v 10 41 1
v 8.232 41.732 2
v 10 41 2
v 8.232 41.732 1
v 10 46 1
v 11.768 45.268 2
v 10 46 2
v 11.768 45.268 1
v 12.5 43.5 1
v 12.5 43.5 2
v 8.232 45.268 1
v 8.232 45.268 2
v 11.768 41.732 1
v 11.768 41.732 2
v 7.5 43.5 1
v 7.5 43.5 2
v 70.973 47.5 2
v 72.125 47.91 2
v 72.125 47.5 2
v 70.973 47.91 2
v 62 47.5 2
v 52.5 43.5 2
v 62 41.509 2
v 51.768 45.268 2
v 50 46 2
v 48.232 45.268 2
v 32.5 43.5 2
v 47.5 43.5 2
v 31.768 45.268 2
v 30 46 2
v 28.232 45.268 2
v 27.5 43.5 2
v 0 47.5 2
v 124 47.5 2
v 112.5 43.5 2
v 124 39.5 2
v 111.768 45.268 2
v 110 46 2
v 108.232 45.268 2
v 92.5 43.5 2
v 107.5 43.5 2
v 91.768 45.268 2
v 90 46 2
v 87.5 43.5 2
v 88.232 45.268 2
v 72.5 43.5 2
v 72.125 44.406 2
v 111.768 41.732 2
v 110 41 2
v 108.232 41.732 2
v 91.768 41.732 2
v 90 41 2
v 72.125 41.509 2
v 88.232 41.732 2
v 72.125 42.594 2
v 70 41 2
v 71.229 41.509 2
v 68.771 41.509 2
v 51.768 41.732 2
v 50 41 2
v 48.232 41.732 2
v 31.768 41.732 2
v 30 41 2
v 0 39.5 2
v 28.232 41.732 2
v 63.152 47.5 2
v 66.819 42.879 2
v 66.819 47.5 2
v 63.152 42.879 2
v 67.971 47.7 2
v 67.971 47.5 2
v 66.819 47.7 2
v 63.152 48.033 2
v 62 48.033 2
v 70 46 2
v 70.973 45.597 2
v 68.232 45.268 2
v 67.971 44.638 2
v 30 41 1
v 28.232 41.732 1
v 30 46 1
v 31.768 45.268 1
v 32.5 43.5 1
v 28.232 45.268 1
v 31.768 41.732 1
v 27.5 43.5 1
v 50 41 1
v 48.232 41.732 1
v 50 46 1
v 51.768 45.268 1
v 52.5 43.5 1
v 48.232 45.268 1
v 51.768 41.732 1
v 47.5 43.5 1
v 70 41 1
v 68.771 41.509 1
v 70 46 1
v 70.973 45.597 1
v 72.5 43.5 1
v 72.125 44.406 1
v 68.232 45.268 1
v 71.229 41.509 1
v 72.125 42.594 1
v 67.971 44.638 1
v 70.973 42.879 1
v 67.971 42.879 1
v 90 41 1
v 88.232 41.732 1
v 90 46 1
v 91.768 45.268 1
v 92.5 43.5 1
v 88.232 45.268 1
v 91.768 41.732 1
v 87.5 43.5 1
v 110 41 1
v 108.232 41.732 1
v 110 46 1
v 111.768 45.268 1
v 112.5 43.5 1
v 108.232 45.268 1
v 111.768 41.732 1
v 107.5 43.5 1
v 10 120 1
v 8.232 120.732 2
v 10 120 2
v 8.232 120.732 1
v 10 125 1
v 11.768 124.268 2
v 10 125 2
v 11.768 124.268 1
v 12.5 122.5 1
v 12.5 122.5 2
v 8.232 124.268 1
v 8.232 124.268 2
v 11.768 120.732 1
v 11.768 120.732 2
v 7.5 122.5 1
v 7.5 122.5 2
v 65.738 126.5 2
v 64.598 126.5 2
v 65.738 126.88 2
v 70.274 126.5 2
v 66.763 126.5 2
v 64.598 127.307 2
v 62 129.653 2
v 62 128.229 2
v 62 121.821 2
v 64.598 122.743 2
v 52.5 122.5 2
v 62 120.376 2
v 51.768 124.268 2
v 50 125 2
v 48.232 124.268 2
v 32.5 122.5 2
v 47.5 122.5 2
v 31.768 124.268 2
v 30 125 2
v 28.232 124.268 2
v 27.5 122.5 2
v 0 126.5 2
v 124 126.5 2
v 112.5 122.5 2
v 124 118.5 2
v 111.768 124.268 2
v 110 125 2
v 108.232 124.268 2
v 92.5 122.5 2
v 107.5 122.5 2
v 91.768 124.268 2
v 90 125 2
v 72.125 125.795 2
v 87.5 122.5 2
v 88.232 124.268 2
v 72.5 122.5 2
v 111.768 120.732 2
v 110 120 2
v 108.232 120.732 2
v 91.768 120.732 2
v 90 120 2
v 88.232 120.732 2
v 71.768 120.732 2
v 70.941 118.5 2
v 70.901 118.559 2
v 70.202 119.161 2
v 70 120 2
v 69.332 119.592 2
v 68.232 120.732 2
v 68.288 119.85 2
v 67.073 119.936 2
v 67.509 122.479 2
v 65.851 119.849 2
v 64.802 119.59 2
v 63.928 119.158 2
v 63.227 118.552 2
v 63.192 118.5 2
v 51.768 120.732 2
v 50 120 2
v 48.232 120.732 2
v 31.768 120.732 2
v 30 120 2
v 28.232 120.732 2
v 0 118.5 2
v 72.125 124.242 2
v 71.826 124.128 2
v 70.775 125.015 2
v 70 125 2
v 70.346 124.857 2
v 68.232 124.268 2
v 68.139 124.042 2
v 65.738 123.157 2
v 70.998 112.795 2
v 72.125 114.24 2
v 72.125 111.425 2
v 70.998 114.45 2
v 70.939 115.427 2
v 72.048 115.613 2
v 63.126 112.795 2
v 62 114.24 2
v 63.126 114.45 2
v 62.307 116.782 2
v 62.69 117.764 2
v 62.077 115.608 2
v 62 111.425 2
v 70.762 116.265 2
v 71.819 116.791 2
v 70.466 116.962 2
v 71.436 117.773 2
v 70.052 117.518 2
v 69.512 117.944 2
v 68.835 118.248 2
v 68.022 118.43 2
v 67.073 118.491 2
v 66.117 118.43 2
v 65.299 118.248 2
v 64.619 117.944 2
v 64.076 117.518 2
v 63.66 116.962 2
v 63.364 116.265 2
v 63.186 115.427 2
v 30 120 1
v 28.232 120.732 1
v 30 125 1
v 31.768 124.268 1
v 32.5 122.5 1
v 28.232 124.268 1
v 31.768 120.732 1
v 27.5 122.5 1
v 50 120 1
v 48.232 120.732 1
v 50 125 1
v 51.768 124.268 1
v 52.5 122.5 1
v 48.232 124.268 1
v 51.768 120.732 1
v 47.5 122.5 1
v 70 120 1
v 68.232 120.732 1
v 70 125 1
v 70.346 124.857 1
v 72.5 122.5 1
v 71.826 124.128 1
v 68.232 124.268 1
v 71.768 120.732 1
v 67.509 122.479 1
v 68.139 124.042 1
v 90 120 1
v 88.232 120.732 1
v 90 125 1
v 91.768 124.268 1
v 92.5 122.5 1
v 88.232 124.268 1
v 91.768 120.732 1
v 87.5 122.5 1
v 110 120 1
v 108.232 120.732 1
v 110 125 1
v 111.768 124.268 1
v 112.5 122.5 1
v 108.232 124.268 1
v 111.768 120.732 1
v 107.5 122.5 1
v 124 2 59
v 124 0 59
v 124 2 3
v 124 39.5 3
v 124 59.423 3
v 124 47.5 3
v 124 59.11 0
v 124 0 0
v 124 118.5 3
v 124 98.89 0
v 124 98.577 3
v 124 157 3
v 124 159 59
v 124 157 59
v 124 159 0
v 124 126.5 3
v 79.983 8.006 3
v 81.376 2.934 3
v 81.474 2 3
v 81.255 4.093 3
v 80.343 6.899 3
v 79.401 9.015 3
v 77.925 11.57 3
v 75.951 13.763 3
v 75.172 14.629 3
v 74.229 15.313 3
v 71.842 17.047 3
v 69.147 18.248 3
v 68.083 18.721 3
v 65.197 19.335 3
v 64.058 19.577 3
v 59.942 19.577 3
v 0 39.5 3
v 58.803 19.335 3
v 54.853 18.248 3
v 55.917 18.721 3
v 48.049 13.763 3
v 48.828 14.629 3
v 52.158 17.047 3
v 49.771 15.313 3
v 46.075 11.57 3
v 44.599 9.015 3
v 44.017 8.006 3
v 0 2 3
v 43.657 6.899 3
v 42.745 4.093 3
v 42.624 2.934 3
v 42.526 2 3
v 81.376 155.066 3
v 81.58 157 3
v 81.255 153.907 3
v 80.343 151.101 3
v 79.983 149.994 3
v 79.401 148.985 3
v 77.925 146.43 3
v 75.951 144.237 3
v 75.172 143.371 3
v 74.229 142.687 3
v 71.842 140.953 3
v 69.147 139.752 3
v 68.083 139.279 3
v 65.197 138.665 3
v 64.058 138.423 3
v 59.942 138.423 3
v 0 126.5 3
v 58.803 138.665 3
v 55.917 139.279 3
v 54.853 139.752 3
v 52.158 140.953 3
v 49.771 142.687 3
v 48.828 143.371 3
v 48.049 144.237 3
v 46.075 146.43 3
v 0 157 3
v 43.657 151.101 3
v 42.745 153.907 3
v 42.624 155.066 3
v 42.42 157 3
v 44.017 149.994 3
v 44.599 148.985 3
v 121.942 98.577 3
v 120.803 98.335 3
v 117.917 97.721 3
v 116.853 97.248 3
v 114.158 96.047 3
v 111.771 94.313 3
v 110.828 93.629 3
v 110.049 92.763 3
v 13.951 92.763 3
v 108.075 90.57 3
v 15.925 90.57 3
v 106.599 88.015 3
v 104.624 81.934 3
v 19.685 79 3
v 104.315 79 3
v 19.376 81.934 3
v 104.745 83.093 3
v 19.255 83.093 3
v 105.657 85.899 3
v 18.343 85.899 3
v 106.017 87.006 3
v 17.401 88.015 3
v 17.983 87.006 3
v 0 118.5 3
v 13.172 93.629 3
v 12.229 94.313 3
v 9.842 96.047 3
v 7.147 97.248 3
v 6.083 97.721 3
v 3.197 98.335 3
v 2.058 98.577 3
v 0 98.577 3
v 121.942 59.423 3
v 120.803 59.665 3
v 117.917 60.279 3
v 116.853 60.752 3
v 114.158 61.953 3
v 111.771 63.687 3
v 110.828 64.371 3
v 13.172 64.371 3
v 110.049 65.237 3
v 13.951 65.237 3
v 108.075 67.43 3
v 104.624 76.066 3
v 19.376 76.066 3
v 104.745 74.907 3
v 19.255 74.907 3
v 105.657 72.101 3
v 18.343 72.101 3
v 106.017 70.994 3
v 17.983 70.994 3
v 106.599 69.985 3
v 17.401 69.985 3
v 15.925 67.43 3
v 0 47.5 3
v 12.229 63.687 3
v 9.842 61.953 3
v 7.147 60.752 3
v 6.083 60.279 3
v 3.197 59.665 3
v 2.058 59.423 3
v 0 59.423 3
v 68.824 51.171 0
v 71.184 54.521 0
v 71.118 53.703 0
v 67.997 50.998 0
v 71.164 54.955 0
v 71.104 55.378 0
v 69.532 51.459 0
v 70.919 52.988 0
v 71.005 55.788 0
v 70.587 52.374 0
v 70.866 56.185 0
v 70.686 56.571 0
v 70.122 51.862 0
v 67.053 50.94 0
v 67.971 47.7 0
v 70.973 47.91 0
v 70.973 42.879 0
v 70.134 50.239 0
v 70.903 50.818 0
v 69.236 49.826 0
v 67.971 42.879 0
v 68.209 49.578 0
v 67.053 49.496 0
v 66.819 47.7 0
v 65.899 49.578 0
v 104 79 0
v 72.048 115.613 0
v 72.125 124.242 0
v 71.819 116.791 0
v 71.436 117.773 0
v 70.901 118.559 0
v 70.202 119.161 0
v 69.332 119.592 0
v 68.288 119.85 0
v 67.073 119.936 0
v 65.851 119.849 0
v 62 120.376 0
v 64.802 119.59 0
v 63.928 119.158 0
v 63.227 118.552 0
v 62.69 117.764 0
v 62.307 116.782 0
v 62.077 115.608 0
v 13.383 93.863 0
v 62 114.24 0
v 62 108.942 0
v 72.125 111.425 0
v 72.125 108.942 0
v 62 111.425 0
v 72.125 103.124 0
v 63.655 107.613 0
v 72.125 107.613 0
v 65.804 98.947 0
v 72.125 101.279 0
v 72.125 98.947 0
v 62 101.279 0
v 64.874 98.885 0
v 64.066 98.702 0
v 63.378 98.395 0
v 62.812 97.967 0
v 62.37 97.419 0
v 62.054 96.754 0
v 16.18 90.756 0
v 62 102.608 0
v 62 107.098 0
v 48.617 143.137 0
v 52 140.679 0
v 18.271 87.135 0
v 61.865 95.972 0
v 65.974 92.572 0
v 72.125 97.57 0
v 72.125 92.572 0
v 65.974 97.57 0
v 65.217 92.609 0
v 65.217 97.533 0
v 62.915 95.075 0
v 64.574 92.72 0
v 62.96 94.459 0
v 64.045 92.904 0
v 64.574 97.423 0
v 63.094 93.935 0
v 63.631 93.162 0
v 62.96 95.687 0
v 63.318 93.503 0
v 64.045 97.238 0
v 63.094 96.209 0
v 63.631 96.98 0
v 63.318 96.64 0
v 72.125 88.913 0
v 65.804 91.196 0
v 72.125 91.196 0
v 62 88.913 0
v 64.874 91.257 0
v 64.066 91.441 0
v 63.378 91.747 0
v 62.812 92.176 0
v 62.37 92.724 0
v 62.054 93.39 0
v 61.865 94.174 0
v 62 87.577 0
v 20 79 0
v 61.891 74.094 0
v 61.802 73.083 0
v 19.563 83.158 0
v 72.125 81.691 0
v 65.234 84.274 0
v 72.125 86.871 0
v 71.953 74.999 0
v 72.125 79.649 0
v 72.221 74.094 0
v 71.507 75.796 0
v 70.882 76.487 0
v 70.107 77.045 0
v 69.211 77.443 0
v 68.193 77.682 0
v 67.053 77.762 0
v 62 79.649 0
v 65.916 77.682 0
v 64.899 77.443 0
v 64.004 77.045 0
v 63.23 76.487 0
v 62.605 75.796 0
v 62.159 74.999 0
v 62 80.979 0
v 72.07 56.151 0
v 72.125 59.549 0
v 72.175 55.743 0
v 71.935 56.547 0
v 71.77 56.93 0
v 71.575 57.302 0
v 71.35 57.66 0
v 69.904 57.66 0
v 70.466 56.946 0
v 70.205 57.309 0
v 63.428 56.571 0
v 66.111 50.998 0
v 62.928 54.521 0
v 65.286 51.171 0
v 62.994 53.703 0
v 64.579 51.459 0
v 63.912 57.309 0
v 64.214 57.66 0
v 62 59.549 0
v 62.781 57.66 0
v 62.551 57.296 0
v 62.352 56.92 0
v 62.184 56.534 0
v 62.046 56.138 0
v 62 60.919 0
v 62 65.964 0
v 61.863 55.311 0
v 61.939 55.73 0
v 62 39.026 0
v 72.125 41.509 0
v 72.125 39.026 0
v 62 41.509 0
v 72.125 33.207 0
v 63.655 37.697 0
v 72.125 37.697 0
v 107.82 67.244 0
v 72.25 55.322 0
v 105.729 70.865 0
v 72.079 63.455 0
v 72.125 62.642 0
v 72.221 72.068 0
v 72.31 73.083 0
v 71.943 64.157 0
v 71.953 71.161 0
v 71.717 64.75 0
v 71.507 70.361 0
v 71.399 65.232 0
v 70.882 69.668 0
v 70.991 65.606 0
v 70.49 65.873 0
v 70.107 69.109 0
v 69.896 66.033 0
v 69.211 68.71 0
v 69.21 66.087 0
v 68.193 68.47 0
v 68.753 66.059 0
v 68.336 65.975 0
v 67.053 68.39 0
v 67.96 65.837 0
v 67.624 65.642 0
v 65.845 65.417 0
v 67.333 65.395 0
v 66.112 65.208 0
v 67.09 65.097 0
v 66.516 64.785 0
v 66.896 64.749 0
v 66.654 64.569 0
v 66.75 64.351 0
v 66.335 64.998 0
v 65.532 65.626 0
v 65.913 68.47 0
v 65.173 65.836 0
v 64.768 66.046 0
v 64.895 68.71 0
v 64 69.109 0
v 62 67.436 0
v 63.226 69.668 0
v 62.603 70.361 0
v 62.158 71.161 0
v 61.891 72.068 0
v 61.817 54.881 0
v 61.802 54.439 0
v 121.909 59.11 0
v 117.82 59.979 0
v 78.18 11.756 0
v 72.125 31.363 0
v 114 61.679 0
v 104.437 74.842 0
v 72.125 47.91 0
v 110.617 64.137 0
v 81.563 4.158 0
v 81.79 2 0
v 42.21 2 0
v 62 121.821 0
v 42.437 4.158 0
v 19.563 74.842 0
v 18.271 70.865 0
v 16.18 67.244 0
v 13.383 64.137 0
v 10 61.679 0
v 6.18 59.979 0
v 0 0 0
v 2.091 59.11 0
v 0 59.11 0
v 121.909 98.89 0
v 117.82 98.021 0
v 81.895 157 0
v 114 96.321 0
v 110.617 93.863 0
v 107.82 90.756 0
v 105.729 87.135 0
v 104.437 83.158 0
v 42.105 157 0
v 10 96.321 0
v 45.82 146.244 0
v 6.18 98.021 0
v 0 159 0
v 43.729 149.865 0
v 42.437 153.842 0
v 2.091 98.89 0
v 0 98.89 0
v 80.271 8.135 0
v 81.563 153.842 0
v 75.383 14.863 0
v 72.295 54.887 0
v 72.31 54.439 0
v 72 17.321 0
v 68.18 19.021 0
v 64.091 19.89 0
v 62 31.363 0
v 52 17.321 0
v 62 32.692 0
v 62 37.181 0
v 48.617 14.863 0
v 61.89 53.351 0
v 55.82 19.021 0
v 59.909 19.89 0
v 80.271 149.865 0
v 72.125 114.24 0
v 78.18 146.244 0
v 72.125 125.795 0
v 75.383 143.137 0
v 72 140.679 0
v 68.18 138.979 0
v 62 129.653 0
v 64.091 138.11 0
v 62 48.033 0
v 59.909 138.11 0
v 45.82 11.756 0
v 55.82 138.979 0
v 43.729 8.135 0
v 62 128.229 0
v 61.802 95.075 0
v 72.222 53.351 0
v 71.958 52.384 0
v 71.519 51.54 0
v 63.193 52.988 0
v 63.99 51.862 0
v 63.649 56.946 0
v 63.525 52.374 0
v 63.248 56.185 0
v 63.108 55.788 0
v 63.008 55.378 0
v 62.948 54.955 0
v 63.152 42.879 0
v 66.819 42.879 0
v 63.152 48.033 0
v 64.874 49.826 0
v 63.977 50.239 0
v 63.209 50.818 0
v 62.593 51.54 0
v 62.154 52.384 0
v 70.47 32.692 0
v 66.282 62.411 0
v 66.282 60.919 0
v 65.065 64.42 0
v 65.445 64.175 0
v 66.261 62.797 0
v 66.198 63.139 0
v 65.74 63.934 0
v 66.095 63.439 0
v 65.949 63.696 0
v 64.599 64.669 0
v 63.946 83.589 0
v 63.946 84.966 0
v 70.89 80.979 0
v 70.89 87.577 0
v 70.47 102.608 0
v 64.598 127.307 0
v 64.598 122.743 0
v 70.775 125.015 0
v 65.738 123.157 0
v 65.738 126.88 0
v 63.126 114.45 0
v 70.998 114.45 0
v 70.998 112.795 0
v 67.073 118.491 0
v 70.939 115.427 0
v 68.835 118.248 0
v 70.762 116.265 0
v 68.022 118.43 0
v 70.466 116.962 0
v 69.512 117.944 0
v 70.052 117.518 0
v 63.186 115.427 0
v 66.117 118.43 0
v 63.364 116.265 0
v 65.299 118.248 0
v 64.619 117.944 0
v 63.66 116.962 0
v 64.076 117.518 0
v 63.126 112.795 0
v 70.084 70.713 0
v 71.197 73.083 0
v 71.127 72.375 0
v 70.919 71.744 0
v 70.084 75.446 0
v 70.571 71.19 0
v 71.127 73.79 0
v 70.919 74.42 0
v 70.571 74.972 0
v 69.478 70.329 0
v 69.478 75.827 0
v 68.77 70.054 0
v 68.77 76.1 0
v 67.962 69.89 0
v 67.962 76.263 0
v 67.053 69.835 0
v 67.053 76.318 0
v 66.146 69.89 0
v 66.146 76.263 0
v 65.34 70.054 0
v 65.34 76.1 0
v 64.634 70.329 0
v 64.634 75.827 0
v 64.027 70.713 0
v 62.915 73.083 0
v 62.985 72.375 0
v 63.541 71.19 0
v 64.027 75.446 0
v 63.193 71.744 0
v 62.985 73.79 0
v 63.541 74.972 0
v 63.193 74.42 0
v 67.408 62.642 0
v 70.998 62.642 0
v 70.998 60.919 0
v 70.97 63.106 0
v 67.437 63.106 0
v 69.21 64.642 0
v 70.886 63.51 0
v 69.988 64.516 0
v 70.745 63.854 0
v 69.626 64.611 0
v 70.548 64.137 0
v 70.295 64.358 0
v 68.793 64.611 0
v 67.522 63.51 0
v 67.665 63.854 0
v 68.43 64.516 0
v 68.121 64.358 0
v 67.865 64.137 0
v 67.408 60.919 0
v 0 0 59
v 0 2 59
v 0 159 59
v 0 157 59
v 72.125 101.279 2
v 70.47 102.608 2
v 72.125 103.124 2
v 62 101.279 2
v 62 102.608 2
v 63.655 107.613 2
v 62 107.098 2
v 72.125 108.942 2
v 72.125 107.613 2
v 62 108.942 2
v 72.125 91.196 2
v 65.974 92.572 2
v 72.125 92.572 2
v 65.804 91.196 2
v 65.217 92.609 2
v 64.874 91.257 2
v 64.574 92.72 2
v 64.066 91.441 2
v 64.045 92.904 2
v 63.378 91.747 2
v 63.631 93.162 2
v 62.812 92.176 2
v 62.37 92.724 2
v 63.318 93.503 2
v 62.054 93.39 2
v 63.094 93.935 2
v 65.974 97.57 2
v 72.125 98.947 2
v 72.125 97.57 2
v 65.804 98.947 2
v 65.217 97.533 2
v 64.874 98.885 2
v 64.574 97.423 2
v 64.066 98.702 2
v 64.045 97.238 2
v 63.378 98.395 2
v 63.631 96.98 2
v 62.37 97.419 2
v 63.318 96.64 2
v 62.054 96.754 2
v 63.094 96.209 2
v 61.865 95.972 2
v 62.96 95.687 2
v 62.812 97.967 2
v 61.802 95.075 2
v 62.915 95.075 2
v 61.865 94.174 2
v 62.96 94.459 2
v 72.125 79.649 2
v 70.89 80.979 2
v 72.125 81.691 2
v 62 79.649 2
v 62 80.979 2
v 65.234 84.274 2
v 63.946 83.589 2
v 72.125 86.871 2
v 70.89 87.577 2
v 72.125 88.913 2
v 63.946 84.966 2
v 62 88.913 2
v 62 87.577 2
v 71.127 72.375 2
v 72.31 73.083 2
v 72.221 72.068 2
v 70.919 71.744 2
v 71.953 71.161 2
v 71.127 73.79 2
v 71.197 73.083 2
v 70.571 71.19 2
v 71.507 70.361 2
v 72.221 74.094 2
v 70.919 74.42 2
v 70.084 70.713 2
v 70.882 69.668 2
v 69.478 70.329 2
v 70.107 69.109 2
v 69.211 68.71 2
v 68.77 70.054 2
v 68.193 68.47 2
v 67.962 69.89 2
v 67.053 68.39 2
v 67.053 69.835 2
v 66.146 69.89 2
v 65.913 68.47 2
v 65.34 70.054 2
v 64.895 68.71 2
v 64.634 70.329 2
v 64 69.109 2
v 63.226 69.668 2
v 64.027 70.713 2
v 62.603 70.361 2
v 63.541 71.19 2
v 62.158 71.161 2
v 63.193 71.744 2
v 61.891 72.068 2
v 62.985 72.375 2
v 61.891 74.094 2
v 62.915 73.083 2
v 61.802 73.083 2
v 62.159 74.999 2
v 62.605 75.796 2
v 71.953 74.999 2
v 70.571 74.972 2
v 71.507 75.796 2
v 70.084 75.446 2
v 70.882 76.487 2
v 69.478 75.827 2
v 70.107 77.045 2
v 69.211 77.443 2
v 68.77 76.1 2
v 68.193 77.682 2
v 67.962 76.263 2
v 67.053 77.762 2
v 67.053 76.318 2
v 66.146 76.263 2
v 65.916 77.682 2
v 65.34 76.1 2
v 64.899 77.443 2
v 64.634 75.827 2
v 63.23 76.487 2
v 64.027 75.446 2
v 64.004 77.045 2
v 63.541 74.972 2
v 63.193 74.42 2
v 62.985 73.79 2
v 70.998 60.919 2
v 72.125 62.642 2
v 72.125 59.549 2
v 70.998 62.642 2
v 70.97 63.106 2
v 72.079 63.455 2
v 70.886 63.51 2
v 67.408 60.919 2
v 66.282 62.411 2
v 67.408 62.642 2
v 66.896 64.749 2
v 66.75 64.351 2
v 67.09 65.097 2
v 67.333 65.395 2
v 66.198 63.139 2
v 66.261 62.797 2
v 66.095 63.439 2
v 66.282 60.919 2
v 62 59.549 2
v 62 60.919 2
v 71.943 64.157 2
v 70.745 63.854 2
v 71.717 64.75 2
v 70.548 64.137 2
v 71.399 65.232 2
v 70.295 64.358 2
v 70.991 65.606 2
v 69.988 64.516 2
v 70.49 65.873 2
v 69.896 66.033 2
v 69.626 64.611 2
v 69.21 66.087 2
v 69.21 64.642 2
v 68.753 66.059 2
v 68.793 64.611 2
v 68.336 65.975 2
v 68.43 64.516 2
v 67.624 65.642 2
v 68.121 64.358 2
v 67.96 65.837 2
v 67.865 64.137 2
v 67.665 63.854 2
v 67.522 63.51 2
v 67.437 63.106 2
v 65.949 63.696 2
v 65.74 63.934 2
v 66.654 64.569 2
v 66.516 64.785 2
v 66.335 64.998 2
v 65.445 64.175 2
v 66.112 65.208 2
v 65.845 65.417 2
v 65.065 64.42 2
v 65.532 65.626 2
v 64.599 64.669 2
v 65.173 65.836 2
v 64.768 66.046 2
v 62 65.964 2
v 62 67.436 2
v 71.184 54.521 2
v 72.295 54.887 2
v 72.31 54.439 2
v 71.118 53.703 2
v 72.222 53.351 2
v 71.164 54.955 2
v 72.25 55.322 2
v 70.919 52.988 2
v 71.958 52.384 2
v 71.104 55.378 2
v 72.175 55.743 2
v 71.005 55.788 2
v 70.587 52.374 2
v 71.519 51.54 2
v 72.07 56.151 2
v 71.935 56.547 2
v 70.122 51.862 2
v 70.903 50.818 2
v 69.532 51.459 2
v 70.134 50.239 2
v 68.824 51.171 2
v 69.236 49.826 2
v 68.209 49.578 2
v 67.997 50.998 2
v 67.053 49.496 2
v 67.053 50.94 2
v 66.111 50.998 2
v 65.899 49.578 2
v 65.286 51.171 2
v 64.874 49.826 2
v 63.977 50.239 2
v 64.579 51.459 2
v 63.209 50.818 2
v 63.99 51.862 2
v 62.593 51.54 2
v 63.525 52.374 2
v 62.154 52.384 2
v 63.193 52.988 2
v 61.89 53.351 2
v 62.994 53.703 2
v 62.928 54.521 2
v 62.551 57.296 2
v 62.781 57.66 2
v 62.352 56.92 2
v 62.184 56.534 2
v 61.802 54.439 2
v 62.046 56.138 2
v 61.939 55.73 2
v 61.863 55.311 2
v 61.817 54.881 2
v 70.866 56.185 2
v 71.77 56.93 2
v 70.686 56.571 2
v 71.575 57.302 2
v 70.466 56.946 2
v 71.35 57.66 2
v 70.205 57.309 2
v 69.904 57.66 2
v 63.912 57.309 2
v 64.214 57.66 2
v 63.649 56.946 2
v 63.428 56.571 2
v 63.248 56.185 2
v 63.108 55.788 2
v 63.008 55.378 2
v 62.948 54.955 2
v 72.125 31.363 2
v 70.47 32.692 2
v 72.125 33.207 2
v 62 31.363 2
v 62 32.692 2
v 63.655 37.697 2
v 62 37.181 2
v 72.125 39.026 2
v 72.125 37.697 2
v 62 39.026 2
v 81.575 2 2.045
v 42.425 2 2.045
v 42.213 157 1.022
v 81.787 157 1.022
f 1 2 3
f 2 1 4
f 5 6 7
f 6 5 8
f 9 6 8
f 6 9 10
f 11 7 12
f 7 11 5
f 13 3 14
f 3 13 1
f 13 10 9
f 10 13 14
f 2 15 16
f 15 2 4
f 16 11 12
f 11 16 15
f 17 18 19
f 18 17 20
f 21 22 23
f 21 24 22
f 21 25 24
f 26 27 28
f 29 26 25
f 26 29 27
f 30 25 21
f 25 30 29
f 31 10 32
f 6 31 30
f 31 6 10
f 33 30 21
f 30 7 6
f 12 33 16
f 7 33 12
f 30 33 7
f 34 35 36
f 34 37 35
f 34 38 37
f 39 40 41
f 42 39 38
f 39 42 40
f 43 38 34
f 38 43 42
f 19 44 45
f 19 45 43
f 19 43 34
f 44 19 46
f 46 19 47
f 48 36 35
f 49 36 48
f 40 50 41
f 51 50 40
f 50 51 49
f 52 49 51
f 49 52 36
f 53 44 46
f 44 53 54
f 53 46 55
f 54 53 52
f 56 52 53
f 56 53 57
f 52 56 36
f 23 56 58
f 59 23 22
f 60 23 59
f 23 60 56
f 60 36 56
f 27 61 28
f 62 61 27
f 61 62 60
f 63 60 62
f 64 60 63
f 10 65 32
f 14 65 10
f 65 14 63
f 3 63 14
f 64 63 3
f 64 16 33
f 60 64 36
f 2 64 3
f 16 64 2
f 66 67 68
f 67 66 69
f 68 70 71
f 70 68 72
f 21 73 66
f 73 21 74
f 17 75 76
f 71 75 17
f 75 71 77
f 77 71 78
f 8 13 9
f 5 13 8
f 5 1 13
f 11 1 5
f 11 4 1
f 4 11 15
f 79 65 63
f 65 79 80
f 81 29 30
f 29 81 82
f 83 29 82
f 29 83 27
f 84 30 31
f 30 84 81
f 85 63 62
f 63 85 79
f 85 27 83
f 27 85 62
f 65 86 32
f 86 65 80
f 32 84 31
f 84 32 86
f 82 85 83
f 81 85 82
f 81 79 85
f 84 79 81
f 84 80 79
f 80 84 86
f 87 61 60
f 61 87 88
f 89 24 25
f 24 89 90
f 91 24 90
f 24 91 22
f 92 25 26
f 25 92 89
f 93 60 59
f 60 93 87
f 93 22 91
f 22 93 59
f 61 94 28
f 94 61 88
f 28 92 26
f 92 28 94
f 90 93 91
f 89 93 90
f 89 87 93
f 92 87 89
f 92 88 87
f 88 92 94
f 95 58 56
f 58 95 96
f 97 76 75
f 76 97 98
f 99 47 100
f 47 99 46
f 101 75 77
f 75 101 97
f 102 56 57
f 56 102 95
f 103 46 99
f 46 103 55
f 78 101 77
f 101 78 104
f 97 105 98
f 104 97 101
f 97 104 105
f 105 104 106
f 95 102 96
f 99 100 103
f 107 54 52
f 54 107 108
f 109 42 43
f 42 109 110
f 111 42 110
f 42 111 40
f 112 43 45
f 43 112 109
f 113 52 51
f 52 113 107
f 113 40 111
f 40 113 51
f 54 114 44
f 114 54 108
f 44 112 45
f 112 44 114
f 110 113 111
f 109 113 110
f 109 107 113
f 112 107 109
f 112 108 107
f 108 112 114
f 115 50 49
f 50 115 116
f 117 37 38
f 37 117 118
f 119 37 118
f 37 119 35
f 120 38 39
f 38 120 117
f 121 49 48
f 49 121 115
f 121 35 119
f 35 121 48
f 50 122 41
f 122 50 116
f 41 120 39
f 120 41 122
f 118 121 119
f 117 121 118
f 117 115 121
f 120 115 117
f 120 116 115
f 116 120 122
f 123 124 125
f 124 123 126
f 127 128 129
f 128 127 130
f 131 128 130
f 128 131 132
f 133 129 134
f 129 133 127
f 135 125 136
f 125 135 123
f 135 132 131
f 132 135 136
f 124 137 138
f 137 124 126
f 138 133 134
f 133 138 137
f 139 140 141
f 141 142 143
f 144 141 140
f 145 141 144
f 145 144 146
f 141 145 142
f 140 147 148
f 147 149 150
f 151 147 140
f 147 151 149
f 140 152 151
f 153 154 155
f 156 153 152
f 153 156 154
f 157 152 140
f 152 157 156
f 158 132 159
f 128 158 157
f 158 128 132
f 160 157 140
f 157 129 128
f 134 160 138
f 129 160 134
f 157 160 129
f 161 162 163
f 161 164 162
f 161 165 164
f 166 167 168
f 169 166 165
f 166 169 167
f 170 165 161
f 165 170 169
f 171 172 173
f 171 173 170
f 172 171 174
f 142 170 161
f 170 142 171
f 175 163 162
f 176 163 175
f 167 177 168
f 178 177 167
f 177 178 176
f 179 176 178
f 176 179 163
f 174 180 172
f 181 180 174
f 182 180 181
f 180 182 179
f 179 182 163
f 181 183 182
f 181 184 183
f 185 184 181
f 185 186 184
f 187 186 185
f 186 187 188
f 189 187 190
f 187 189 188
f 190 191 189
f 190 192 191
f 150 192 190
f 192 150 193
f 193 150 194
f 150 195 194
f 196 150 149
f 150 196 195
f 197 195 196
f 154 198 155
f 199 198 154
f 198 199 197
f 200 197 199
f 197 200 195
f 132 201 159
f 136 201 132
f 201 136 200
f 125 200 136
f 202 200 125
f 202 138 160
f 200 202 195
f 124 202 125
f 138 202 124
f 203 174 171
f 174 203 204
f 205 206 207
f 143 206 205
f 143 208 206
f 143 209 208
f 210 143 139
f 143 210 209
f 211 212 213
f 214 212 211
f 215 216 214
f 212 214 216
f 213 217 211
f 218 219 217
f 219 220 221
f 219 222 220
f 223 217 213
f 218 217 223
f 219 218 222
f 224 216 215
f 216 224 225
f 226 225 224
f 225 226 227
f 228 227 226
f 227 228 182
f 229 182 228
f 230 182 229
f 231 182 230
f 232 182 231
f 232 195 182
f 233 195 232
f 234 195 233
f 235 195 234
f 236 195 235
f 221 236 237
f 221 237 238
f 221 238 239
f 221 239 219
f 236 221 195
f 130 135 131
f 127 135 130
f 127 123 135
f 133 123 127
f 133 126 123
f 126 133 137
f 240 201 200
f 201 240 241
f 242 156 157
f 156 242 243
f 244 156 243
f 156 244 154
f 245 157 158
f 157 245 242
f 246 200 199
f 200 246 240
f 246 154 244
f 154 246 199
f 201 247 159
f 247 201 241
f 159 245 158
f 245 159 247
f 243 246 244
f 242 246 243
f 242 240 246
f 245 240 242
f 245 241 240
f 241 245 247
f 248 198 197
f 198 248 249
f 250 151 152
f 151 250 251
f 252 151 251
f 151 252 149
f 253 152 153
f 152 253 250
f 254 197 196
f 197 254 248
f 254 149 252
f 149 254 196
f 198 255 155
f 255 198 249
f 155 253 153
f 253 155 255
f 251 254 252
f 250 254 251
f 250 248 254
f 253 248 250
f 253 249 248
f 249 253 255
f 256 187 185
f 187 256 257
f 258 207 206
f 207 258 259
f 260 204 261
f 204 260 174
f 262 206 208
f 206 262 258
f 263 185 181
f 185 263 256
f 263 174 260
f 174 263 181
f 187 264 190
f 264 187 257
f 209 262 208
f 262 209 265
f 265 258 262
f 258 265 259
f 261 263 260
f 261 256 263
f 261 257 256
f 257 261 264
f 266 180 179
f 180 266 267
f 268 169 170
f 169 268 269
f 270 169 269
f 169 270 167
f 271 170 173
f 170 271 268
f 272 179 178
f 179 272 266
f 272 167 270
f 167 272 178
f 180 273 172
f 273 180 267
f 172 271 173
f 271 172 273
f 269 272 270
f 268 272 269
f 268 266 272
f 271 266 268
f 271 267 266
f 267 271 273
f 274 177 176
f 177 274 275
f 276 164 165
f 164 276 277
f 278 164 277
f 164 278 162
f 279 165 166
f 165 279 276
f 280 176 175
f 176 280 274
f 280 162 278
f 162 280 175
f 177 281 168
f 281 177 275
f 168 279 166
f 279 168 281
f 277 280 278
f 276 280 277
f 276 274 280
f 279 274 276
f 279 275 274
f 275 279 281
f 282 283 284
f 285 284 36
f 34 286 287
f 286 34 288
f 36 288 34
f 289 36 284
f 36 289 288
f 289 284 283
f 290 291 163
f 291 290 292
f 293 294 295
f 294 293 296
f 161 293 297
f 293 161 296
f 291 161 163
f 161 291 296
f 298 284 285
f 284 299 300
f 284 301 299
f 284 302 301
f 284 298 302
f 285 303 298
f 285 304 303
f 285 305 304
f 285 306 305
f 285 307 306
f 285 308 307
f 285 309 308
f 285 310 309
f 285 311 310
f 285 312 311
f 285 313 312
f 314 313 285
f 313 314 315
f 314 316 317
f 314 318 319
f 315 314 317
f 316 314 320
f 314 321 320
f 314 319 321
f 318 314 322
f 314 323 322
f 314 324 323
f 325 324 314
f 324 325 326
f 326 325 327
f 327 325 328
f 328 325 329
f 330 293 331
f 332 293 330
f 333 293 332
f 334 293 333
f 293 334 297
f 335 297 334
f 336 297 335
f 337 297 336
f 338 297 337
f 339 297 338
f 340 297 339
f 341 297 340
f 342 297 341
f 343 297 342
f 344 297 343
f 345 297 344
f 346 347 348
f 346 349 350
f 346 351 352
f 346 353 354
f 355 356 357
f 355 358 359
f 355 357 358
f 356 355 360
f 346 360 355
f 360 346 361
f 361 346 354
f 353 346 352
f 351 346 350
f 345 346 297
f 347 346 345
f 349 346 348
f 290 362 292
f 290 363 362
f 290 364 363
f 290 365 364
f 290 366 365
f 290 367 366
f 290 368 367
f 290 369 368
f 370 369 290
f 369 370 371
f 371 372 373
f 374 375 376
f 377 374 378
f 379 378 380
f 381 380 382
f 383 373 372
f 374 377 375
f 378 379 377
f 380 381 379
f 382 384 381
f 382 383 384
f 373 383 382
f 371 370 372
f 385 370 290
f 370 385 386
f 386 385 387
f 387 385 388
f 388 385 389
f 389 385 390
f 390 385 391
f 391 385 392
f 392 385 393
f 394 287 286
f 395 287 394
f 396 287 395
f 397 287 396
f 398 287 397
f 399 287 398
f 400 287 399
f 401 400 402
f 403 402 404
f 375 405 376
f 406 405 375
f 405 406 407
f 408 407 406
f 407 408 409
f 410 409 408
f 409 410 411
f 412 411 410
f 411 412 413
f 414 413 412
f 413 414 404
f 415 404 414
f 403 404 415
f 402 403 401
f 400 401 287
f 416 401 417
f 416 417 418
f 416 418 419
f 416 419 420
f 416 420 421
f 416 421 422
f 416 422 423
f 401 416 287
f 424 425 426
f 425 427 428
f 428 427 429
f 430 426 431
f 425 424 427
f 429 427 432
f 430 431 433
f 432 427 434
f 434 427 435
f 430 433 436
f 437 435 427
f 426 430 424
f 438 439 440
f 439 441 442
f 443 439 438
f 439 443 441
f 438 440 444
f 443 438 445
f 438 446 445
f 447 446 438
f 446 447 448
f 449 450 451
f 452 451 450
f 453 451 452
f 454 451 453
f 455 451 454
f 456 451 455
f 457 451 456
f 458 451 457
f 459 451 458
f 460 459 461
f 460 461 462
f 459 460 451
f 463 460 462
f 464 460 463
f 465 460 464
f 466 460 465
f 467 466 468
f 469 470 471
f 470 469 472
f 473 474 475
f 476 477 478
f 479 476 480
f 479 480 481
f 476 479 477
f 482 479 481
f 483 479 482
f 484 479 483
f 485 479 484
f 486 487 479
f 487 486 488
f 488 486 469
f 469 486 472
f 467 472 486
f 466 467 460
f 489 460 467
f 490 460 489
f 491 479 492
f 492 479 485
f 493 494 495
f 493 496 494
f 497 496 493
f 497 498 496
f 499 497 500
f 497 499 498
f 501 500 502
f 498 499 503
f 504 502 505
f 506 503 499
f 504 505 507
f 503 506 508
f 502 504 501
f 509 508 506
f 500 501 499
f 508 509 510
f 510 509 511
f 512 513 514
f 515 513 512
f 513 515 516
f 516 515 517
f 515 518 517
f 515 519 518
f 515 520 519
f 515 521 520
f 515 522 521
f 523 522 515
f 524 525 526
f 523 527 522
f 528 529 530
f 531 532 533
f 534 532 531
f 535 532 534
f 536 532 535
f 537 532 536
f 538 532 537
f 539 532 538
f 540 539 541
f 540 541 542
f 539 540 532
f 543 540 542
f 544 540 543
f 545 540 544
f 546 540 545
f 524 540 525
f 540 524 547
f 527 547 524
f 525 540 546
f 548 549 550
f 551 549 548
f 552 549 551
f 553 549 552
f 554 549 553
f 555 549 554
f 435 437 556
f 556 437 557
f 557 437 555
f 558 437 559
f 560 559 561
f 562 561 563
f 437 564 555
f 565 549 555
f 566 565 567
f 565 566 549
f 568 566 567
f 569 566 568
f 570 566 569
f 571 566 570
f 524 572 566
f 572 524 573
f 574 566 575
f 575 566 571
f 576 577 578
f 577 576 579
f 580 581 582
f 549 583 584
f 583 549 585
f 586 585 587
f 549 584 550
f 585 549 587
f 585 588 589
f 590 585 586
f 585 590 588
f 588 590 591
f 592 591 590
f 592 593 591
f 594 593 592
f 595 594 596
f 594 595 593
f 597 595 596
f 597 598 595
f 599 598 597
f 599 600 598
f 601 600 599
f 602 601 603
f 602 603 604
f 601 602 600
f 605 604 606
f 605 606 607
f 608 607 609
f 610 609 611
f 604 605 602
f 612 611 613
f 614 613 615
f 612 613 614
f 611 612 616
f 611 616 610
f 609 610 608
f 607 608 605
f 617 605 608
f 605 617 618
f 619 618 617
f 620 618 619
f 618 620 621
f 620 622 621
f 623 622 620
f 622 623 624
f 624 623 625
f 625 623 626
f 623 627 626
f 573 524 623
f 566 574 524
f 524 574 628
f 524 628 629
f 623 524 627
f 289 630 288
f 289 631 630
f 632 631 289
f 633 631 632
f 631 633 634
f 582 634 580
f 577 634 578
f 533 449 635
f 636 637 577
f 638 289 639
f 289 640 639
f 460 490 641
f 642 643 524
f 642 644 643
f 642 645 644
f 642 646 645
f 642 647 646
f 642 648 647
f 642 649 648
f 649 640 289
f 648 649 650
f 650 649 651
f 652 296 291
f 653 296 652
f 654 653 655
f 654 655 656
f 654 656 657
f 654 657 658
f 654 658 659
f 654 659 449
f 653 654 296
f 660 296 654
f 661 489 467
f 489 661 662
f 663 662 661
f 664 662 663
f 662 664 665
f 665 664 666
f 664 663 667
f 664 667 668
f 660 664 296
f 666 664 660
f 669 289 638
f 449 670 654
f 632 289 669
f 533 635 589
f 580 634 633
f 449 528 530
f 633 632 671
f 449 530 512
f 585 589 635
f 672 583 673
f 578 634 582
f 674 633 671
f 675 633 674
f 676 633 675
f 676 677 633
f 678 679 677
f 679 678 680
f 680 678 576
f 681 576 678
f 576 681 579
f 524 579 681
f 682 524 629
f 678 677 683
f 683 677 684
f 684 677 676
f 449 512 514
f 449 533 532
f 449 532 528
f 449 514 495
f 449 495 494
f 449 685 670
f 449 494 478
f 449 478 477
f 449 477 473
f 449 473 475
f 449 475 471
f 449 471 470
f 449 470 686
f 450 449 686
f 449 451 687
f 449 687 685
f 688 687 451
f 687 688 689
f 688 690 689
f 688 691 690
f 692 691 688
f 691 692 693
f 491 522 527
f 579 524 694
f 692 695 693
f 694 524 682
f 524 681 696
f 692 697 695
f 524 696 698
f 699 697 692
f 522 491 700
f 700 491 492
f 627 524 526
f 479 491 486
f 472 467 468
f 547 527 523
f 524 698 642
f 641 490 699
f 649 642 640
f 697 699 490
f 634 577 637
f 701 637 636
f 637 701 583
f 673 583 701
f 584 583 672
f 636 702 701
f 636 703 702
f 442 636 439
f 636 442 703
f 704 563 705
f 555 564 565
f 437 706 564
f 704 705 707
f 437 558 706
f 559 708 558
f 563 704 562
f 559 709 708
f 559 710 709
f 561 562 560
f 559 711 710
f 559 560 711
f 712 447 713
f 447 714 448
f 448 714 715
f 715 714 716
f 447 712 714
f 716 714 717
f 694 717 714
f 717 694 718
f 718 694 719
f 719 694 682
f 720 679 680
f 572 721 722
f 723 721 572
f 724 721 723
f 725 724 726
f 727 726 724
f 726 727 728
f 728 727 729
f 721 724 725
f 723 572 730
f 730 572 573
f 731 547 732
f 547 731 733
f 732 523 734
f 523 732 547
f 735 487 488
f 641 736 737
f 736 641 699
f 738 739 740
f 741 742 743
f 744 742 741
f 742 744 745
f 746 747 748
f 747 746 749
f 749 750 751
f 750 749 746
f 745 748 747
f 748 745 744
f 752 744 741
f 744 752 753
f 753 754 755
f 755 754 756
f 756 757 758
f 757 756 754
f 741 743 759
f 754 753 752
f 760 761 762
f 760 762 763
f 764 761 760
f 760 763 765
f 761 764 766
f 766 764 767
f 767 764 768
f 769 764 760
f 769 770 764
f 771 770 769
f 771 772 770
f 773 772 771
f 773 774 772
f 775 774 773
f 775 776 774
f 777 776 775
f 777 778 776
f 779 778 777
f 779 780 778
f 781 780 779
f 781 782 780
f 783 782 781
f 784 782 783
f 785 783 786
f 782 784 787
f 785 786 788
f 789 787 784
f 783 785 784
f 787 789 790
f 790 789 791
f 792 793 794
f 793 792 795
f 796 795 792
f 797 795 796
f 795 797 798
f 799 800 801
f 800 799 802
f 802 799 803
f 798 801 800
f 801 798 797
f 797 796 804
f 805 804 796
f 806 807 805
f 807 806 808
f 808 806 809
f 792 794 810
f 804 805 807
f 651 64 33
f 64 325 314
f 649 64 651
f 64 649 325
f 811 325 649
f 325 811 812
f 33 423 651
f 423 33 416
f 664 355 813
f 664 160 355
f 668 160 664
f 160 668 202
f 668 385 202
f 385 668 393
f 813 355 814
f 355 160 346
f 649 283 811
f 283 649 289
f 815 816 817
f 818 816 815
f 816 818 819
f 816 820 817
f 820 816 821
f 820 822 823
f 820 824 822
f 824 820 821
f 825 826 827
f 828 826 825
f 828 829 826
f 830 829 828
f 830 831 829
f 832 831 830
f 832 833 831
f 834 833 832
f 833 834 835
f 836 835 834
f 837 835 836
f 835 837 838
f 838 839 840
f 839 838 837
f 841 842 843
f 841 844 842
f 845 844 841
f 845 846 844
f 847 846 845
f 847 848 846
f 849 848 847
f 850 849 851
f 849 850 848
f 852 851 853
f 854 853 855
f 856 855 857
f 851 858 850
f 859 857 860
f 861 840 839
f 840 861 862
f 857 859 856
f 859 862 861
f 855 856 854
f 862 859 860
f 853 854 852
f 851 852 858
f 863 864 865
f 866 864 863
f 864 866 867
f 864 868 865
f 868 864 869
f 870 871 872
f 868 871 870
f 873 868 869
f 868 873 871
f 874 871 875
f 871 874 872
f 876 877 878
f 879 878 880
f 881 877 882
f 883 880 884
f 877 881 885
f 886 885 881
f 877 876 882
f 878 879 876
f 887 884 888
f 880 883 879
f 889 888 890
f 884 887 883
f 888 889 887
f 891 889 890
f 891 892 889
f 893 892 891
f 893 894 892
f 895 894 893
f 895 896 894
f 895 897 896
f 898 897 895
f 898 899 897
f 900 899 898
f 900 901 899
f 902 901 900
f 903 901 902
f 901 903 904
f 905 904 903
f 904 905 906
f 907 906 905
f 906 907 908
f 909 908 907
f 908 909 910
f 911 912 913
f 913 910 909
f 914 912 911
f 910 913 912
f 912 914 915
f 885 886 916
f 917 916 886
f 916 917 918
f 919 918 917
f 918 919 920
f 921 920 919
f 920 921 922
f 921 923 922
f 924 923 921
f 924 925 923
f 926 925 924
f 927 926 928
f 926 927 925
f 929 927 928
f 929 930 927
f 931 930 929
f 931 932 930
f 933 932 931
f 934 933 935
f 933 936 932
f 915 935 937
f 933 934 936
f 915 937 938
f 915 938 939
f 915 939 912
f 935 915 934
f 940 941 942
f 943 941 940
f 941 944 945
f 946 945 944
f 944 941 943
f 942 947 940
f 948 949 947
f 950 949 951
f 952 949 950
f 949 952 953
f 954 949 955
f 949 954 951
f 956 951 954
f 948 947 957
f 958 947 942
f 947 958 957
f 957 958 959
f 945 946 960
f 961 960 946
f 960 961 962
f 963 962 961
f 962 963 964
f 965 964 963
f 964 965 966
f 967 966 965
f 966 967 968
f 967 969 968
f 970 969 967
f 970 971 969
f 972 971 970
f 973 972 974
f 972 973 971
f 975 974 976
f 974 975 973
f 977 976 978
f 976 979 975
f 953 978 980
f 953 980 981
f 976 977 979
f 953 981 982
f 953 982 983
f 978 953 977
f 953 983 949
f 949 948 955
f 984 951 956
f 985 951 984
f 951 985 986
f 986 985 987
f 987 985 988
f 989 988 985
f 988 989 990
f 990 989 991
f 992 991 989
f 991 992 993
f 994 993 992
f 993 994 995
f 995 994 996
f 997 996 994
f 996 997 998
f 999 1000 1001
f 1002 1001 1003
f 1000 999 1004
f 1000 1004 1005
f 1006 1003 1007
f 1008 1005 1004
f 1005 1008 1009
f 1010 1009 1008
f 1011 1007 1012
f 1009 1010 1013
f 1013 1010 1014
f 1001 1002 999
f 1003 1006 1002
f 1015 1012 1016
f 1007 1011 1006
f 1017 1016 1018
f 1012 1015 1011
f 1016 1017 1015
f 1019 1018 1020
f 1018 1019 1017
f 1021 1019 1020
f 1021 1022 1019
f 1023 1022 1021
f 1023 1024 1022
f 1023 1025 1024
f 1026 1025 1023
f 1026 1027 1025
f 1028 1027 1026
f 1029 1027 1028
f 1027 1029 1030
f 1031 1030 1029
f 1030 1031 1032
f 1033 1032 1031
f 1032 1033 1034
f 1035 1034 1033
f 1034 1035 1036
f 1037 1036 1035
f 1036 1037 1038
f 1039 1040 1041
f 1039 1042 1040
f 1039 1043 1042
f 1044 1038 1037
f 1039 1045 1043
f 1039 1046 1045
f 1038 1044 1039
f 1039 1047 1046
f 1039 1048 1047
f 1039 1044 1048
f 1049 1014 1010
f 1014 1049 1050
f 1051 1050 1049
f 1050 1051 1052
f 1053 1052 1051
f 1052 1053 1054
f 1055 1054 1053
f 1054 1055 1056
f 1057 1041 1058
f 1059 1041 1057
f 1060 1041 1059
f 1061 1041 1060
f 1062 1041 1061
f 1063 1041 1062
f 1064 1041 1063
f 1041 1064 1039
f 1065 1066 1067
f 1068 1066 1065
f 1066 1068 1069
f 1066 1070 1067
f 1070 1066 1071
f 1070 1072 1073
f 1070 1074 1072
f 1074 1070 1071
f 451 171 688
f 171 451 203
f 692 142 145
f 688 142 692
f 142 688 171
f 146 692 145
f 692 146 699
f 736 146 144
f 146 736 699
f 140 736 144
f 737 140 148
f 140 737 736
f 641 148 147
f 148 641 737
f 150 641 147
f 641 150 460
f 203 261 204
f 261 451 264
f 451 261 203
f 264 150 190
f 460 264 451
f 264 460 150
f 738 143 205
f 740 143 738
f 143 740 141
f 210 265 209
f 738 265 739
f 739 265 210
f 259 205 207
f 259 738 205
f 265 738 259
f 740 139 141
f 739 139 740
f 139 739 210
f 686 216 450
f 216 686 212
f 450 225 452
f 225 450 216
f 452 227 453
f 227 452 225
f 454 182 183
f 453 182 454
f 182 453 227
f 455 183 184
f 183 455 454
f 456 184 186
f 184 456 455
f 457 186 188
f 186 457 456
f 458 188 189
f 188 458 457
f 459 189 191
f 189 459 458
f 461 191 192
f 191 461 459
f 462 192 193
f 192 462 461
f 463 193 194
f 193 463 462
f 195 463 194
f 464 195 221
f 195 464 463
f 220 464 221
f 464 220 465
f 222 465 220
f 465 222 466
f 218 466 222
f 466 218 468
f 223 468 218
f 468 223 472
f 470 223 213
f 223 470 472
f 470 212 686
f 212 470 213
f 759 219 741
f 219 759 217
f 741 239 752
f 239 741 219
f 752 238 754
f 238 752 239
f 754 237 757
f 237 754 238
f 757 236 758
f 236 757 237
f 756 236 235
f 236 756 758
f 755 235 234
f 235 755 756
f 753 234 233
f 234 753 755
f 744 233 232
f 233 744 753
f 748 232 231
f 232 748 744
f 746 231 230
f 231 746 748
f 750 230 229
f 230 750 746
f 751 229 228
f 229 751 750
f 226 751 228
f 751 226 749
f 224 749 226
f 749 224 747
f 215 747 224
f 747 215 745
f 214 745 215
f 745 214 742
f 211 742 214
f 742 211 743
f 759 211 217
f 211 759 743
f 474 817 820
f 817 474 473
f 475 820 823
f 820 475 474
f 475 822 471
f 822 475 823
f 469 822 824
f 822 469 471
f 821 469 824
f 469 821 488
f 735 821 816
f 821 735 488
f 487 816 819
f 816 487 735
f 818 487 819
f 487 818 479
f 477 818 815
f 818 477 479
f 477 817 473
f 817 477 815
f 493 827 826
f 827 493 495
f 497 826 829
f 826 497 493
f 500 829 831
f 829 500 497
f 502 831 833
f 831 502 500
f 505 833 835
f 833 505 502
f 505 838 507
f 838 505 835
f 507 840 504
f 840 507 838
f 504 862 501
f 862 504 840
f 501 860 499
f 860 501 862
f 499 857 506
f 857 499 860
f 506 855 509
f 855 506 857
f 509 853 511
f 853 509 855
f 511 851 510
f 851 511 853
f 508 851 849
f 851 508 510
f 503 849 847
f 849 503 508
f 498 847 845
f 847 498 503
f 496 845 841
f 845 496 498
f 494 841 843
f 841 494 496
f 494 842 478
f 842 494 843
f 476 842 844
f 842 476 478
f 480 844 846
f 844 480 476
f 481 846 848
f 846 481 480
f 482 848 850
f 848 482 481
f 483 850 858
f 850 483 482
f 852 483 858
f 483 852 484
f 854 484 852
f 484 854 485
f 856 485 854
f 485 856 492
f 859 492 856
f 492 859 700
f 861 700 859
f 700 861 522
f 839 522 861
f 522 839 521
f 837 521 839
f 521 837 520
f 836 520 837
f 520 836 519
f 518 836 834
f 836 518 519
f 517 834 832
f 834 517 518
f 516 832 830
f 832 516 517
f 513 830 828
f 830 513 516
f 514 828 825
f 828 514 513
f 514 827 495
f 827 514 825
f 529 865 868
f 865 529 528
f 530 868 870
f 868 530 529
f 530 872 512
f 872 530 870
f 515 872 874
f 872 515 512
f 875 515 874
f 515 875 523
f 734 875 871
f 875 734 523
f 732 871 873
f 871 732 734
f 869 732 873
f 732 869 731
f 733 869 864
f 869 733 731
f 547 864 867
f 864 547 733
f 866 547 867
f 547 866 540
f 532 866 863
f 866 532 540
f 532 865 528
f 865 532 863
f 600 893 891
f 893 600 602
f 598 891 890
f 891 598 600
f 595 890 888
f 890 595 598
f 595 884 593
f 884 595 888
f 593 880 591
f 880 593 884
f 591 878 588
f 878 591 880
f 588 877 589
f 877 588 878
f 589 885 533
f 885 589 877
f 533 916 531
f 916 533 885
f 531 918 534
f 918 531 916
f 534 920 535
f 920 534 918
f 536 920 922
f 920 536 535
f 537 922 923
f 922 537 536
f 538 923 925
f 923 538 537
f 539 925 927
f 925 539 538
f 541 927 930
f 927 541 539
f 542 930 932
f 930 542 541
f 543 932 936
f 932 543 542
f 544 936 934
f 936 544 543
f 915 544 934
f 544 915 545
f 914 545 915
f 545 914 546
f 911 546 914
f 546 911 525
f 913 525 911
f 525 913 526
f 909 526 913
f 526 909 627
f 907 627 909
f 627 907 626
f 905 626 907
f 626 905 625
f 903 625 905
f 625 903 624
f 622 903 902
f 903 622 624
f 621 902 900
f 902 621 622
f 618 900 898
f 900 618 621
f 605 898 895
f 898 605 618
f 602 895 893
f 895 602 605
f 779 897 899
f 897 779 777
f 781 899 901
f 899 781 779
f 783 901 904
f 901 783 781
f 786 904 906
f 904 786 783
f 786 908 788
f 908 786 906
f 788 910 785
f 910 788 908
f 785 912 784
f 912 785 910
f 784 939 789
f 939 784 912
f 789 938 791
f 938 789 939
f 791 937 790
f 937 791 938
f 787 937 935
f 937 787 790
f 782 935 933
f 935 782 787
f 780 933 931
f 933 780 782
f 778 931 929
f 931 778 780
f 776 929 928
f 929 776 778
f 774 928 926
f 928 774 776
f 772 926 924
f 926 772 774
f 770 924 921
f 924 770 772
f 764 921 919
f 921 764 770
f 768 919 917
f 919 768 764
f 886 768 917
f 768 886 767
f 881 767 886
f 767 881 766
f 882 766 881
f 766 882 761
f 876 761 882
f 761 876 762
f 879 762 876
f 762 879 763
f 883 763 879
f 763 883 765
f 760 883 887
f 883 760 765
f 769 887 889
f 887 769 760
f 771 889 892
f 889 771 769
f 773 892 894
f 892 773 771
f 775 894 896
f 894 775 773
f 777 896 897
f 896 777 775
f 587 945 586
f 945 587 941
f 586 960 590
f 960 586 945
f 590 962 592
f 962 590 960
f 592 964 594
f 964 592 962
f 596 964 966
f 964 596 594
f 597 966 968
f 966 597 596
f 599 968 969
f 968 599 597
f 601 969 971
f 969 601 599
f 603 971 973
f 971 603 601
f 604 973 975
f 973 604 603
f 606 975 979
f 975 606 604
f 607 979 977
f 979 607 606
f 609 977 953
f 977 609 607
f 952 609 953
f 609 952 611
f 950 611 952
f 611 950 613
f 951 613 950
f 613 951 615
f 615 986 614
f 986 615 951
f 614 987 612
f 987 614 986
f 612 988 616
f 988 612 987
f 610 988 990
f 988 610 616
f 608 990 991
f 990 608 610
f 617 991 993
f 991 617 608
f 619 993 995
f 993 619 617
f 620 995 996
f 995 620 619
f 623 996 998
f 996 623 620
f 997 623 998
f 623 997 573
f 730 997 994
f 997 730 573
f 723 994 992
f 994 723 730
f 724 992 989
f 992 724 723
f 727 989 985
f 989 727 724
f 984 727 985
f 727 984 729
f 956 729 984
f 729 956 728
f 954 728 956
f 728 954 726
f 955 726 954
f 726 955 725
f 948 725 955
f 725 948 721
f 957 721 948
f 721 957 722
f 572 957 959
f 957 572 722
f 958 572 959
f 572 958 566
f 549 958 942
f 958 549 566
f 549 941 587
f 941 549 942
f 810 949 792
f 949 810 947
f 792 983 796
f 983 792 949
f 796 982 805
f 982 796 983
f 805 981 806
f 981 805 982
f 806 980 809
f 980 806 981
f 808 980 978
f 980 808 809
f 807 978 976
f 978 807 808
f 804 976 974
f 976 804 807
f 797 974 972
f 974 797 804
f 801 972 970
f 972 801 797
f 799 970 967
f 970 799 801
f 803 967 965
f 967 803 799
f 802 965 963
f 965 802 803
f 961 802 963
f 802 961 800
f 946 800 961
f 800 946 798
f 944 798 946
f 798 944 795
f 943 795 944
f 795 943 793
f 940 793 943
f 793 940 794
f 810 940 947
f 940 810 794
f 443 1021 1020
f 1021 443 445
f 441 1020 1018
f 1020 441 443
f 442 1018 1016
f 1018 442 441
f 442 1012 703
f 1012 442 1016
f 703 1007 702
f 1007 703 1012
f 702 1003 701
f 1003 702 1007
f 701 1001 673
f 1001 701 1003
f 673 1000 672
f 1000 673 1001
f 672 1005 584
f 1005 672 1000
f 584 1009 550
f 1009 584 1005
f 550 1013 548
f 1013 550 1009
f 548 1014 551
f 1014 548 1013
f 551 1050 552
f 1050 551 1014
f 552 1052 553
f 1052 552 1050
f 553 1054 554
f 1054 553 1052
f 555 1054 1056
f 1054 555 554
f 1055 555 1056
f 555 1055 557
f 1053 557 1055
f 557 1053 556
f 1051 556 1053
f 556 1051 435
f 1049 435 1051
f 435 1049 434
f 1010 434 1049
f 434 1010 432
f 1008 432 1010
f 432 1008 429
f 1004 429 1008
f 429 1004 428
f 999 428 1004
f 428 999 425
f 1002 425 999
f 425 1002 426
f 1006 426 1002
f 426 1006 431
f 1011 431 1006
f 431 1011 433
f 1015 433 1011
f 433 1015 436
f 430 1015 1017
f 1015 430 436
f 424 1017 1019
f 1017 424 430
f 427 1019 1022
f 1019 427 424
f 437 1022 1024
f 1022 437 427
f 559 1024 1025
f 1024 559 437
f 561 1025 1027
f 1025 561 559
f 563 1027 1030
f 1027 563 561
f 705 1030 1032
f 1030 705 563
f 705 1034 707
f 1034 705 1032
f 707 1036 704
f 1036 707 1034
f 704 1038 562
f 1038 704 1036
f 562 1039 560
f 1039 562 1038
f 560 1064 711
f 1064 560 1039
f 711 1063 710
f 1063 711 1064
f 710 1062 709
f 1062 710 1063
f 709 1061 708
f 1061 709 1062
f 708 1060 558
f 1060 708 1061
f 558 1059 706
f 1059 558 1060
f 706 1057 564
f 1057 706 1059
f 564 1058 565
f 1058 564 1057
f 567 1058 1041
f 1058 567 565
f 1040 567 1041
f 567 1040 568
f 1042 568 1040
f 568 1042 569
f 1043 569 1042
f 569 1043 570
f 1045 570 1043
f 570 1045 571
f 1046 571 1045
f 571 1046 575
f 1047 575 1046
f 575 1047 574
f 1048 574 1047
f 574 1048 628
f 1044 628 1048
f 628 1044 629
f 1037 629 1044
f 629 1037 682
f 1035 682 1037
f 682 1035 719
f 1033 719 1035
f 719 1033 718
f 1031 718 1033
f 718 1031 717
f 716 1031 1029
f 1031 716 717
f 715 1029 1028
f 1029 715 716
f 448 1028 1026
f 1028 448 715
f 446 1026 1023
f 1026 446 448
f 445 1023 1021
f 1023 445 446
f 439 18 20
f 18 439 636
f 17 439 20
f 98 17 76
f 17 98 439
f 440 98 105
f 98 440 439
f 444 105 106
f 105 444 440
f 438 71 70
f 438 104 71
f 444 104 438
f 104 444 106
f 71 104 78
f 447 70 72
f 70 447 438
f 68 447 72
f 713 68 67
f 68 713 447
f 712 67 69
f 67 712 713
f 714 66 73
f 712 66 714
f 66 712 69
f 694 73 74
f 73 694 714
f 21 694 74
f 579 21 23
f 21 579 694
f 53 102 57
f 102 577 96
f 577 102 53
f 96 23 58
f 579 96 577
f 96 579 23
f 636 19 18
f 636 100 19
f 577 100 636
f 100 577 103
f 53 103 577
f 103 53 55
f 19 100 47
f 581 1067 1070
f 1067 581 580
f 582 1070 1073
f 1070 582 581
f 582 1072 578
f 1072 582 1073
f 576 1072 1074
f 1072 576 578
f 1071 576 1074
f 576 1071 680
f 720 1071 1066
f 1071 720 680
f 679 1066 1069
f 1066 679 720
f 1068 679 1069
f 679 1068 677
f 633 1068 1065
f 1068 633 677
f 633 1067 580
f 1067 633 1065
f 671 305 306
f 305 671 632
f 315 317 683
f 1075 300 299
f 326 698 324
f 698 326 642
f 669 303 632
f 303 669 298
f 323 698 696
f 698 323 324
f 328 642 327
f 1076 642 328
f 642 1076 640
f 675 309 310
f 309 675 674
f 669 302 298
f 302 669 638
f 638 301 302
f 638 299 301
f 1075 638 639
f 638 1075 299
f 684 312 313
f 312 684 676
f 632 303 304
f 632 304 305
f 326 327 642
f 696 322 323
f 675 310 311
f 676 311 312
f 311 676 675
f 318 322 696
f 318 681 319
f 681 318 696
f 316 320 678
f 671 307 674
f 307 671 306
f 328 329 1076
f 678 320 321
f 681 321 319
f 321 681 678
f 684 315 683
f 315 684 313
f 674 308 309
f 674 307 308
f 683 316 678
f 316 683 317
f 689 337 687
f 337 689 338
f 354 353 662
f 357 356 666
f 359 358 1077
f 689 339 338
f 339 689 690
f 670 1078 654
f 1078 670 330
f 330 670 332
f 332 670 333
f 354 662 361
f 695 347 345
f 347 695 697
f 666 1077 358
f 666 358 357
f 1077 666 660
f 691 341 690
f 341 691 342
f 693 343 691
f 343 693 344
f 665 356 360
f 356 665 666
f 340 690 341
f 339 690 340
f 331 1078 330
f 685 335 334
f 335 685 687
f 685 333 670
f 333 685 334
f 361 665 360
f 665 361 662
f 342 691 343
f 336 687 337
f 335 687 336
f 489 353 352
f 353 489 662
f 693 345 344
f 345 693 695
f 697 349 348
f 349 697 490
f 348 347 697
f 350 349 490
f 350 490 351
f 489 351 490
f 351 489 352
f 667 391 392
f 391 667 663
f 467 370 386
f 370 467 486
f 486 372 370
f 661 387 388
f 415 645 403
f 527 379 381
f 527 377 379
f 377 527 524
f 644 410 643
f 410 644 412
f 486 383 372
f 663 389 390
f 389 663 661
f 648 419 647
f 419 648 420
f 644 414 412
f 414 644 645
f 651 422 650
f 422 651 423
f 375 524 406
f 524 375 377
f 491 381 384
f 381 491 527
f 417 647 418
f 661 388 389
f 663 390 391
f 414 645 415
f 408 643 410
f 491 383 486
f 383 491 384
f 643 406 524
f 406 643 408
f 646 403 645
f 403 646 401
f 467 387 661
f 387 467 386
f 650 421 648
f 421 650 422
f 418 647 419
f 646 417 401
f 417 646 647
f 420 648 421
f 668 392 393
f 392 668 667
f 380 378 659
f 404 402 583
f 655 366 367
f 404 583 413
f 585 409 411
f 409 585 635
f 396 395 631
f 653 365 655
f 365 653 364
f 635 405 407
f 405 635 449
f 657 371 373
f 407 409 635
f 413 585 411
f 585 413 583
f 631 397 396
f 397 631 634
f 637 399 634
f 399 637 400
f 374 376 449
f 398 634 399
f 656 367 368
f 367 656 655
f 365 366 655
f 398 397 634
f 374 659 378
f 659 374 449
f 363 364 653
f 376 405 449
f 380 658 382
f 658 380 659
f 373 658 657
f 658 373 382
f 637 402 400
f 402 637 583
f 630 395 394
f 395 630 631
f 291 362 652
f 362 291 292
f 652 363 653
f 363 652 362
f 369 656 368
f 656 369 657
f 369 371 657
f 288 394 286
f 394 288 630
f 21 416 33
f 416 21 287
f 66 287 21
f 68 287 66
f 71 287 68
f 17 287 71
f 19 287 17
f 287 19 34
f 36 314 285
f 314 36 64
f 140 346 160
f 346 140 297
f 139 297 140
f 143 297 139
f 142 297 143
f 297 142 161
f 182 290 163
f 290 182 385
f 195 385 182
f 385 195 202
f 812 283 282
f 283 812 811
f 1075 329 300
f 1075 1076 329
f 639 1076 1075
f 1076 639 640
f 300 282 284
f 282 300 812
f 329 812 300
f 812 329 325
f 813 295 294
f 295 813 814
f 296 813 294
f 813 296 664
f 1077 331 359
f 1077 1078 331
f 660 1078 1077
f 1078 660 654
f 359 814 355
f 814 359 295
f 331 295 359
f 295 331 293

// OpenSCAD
//$fn=360;
//67x93x22
x=124;
y=158;
z=59;

difference () {
  cube([x,y,3]);
  linear_extrude(2)
  translate ([x/2,30,0])
  rotate([0,180,270])
  text ("NECROMUNDA",font="Copperplate");
  translate ([x/2,0,0])
  sphere (d=40);  
  translate ([x/2,y,0])
  sphere (d=40);  
  translate ([0,y/2,0])
  sphere (d=40);  
  translate ([x,y/2,0])
  sphere (d=40);  
  translate ([0,y/4,2])
  cube([x,8,1]);
  for ( x1= [10,30,50,70,90,110] ) {
    translate ([x1,y/4+4,1])
    cylinder(h=1,d=5);
  }
  translate ([0,((y/4)*3),2])
  cube([x,8,1]);
  for ( x1= [10,30,50,70,90,110] ) {
    translate ([x1,((y/4)*3+4),1])
    cylinder(h=1,d=5);
  }
  //translate ([x/2,y/2,1])
  //scale([1,1,0.05])
  //rotate([0,180,0])
  //surface(file="/Users/rogerio/Downloads/Palanite_Enforcers_Symbol.png",center=true,invert=false);

}
cube([x,2,z]);
translate ([0,y-1,0])
cube([x,2,z]);
